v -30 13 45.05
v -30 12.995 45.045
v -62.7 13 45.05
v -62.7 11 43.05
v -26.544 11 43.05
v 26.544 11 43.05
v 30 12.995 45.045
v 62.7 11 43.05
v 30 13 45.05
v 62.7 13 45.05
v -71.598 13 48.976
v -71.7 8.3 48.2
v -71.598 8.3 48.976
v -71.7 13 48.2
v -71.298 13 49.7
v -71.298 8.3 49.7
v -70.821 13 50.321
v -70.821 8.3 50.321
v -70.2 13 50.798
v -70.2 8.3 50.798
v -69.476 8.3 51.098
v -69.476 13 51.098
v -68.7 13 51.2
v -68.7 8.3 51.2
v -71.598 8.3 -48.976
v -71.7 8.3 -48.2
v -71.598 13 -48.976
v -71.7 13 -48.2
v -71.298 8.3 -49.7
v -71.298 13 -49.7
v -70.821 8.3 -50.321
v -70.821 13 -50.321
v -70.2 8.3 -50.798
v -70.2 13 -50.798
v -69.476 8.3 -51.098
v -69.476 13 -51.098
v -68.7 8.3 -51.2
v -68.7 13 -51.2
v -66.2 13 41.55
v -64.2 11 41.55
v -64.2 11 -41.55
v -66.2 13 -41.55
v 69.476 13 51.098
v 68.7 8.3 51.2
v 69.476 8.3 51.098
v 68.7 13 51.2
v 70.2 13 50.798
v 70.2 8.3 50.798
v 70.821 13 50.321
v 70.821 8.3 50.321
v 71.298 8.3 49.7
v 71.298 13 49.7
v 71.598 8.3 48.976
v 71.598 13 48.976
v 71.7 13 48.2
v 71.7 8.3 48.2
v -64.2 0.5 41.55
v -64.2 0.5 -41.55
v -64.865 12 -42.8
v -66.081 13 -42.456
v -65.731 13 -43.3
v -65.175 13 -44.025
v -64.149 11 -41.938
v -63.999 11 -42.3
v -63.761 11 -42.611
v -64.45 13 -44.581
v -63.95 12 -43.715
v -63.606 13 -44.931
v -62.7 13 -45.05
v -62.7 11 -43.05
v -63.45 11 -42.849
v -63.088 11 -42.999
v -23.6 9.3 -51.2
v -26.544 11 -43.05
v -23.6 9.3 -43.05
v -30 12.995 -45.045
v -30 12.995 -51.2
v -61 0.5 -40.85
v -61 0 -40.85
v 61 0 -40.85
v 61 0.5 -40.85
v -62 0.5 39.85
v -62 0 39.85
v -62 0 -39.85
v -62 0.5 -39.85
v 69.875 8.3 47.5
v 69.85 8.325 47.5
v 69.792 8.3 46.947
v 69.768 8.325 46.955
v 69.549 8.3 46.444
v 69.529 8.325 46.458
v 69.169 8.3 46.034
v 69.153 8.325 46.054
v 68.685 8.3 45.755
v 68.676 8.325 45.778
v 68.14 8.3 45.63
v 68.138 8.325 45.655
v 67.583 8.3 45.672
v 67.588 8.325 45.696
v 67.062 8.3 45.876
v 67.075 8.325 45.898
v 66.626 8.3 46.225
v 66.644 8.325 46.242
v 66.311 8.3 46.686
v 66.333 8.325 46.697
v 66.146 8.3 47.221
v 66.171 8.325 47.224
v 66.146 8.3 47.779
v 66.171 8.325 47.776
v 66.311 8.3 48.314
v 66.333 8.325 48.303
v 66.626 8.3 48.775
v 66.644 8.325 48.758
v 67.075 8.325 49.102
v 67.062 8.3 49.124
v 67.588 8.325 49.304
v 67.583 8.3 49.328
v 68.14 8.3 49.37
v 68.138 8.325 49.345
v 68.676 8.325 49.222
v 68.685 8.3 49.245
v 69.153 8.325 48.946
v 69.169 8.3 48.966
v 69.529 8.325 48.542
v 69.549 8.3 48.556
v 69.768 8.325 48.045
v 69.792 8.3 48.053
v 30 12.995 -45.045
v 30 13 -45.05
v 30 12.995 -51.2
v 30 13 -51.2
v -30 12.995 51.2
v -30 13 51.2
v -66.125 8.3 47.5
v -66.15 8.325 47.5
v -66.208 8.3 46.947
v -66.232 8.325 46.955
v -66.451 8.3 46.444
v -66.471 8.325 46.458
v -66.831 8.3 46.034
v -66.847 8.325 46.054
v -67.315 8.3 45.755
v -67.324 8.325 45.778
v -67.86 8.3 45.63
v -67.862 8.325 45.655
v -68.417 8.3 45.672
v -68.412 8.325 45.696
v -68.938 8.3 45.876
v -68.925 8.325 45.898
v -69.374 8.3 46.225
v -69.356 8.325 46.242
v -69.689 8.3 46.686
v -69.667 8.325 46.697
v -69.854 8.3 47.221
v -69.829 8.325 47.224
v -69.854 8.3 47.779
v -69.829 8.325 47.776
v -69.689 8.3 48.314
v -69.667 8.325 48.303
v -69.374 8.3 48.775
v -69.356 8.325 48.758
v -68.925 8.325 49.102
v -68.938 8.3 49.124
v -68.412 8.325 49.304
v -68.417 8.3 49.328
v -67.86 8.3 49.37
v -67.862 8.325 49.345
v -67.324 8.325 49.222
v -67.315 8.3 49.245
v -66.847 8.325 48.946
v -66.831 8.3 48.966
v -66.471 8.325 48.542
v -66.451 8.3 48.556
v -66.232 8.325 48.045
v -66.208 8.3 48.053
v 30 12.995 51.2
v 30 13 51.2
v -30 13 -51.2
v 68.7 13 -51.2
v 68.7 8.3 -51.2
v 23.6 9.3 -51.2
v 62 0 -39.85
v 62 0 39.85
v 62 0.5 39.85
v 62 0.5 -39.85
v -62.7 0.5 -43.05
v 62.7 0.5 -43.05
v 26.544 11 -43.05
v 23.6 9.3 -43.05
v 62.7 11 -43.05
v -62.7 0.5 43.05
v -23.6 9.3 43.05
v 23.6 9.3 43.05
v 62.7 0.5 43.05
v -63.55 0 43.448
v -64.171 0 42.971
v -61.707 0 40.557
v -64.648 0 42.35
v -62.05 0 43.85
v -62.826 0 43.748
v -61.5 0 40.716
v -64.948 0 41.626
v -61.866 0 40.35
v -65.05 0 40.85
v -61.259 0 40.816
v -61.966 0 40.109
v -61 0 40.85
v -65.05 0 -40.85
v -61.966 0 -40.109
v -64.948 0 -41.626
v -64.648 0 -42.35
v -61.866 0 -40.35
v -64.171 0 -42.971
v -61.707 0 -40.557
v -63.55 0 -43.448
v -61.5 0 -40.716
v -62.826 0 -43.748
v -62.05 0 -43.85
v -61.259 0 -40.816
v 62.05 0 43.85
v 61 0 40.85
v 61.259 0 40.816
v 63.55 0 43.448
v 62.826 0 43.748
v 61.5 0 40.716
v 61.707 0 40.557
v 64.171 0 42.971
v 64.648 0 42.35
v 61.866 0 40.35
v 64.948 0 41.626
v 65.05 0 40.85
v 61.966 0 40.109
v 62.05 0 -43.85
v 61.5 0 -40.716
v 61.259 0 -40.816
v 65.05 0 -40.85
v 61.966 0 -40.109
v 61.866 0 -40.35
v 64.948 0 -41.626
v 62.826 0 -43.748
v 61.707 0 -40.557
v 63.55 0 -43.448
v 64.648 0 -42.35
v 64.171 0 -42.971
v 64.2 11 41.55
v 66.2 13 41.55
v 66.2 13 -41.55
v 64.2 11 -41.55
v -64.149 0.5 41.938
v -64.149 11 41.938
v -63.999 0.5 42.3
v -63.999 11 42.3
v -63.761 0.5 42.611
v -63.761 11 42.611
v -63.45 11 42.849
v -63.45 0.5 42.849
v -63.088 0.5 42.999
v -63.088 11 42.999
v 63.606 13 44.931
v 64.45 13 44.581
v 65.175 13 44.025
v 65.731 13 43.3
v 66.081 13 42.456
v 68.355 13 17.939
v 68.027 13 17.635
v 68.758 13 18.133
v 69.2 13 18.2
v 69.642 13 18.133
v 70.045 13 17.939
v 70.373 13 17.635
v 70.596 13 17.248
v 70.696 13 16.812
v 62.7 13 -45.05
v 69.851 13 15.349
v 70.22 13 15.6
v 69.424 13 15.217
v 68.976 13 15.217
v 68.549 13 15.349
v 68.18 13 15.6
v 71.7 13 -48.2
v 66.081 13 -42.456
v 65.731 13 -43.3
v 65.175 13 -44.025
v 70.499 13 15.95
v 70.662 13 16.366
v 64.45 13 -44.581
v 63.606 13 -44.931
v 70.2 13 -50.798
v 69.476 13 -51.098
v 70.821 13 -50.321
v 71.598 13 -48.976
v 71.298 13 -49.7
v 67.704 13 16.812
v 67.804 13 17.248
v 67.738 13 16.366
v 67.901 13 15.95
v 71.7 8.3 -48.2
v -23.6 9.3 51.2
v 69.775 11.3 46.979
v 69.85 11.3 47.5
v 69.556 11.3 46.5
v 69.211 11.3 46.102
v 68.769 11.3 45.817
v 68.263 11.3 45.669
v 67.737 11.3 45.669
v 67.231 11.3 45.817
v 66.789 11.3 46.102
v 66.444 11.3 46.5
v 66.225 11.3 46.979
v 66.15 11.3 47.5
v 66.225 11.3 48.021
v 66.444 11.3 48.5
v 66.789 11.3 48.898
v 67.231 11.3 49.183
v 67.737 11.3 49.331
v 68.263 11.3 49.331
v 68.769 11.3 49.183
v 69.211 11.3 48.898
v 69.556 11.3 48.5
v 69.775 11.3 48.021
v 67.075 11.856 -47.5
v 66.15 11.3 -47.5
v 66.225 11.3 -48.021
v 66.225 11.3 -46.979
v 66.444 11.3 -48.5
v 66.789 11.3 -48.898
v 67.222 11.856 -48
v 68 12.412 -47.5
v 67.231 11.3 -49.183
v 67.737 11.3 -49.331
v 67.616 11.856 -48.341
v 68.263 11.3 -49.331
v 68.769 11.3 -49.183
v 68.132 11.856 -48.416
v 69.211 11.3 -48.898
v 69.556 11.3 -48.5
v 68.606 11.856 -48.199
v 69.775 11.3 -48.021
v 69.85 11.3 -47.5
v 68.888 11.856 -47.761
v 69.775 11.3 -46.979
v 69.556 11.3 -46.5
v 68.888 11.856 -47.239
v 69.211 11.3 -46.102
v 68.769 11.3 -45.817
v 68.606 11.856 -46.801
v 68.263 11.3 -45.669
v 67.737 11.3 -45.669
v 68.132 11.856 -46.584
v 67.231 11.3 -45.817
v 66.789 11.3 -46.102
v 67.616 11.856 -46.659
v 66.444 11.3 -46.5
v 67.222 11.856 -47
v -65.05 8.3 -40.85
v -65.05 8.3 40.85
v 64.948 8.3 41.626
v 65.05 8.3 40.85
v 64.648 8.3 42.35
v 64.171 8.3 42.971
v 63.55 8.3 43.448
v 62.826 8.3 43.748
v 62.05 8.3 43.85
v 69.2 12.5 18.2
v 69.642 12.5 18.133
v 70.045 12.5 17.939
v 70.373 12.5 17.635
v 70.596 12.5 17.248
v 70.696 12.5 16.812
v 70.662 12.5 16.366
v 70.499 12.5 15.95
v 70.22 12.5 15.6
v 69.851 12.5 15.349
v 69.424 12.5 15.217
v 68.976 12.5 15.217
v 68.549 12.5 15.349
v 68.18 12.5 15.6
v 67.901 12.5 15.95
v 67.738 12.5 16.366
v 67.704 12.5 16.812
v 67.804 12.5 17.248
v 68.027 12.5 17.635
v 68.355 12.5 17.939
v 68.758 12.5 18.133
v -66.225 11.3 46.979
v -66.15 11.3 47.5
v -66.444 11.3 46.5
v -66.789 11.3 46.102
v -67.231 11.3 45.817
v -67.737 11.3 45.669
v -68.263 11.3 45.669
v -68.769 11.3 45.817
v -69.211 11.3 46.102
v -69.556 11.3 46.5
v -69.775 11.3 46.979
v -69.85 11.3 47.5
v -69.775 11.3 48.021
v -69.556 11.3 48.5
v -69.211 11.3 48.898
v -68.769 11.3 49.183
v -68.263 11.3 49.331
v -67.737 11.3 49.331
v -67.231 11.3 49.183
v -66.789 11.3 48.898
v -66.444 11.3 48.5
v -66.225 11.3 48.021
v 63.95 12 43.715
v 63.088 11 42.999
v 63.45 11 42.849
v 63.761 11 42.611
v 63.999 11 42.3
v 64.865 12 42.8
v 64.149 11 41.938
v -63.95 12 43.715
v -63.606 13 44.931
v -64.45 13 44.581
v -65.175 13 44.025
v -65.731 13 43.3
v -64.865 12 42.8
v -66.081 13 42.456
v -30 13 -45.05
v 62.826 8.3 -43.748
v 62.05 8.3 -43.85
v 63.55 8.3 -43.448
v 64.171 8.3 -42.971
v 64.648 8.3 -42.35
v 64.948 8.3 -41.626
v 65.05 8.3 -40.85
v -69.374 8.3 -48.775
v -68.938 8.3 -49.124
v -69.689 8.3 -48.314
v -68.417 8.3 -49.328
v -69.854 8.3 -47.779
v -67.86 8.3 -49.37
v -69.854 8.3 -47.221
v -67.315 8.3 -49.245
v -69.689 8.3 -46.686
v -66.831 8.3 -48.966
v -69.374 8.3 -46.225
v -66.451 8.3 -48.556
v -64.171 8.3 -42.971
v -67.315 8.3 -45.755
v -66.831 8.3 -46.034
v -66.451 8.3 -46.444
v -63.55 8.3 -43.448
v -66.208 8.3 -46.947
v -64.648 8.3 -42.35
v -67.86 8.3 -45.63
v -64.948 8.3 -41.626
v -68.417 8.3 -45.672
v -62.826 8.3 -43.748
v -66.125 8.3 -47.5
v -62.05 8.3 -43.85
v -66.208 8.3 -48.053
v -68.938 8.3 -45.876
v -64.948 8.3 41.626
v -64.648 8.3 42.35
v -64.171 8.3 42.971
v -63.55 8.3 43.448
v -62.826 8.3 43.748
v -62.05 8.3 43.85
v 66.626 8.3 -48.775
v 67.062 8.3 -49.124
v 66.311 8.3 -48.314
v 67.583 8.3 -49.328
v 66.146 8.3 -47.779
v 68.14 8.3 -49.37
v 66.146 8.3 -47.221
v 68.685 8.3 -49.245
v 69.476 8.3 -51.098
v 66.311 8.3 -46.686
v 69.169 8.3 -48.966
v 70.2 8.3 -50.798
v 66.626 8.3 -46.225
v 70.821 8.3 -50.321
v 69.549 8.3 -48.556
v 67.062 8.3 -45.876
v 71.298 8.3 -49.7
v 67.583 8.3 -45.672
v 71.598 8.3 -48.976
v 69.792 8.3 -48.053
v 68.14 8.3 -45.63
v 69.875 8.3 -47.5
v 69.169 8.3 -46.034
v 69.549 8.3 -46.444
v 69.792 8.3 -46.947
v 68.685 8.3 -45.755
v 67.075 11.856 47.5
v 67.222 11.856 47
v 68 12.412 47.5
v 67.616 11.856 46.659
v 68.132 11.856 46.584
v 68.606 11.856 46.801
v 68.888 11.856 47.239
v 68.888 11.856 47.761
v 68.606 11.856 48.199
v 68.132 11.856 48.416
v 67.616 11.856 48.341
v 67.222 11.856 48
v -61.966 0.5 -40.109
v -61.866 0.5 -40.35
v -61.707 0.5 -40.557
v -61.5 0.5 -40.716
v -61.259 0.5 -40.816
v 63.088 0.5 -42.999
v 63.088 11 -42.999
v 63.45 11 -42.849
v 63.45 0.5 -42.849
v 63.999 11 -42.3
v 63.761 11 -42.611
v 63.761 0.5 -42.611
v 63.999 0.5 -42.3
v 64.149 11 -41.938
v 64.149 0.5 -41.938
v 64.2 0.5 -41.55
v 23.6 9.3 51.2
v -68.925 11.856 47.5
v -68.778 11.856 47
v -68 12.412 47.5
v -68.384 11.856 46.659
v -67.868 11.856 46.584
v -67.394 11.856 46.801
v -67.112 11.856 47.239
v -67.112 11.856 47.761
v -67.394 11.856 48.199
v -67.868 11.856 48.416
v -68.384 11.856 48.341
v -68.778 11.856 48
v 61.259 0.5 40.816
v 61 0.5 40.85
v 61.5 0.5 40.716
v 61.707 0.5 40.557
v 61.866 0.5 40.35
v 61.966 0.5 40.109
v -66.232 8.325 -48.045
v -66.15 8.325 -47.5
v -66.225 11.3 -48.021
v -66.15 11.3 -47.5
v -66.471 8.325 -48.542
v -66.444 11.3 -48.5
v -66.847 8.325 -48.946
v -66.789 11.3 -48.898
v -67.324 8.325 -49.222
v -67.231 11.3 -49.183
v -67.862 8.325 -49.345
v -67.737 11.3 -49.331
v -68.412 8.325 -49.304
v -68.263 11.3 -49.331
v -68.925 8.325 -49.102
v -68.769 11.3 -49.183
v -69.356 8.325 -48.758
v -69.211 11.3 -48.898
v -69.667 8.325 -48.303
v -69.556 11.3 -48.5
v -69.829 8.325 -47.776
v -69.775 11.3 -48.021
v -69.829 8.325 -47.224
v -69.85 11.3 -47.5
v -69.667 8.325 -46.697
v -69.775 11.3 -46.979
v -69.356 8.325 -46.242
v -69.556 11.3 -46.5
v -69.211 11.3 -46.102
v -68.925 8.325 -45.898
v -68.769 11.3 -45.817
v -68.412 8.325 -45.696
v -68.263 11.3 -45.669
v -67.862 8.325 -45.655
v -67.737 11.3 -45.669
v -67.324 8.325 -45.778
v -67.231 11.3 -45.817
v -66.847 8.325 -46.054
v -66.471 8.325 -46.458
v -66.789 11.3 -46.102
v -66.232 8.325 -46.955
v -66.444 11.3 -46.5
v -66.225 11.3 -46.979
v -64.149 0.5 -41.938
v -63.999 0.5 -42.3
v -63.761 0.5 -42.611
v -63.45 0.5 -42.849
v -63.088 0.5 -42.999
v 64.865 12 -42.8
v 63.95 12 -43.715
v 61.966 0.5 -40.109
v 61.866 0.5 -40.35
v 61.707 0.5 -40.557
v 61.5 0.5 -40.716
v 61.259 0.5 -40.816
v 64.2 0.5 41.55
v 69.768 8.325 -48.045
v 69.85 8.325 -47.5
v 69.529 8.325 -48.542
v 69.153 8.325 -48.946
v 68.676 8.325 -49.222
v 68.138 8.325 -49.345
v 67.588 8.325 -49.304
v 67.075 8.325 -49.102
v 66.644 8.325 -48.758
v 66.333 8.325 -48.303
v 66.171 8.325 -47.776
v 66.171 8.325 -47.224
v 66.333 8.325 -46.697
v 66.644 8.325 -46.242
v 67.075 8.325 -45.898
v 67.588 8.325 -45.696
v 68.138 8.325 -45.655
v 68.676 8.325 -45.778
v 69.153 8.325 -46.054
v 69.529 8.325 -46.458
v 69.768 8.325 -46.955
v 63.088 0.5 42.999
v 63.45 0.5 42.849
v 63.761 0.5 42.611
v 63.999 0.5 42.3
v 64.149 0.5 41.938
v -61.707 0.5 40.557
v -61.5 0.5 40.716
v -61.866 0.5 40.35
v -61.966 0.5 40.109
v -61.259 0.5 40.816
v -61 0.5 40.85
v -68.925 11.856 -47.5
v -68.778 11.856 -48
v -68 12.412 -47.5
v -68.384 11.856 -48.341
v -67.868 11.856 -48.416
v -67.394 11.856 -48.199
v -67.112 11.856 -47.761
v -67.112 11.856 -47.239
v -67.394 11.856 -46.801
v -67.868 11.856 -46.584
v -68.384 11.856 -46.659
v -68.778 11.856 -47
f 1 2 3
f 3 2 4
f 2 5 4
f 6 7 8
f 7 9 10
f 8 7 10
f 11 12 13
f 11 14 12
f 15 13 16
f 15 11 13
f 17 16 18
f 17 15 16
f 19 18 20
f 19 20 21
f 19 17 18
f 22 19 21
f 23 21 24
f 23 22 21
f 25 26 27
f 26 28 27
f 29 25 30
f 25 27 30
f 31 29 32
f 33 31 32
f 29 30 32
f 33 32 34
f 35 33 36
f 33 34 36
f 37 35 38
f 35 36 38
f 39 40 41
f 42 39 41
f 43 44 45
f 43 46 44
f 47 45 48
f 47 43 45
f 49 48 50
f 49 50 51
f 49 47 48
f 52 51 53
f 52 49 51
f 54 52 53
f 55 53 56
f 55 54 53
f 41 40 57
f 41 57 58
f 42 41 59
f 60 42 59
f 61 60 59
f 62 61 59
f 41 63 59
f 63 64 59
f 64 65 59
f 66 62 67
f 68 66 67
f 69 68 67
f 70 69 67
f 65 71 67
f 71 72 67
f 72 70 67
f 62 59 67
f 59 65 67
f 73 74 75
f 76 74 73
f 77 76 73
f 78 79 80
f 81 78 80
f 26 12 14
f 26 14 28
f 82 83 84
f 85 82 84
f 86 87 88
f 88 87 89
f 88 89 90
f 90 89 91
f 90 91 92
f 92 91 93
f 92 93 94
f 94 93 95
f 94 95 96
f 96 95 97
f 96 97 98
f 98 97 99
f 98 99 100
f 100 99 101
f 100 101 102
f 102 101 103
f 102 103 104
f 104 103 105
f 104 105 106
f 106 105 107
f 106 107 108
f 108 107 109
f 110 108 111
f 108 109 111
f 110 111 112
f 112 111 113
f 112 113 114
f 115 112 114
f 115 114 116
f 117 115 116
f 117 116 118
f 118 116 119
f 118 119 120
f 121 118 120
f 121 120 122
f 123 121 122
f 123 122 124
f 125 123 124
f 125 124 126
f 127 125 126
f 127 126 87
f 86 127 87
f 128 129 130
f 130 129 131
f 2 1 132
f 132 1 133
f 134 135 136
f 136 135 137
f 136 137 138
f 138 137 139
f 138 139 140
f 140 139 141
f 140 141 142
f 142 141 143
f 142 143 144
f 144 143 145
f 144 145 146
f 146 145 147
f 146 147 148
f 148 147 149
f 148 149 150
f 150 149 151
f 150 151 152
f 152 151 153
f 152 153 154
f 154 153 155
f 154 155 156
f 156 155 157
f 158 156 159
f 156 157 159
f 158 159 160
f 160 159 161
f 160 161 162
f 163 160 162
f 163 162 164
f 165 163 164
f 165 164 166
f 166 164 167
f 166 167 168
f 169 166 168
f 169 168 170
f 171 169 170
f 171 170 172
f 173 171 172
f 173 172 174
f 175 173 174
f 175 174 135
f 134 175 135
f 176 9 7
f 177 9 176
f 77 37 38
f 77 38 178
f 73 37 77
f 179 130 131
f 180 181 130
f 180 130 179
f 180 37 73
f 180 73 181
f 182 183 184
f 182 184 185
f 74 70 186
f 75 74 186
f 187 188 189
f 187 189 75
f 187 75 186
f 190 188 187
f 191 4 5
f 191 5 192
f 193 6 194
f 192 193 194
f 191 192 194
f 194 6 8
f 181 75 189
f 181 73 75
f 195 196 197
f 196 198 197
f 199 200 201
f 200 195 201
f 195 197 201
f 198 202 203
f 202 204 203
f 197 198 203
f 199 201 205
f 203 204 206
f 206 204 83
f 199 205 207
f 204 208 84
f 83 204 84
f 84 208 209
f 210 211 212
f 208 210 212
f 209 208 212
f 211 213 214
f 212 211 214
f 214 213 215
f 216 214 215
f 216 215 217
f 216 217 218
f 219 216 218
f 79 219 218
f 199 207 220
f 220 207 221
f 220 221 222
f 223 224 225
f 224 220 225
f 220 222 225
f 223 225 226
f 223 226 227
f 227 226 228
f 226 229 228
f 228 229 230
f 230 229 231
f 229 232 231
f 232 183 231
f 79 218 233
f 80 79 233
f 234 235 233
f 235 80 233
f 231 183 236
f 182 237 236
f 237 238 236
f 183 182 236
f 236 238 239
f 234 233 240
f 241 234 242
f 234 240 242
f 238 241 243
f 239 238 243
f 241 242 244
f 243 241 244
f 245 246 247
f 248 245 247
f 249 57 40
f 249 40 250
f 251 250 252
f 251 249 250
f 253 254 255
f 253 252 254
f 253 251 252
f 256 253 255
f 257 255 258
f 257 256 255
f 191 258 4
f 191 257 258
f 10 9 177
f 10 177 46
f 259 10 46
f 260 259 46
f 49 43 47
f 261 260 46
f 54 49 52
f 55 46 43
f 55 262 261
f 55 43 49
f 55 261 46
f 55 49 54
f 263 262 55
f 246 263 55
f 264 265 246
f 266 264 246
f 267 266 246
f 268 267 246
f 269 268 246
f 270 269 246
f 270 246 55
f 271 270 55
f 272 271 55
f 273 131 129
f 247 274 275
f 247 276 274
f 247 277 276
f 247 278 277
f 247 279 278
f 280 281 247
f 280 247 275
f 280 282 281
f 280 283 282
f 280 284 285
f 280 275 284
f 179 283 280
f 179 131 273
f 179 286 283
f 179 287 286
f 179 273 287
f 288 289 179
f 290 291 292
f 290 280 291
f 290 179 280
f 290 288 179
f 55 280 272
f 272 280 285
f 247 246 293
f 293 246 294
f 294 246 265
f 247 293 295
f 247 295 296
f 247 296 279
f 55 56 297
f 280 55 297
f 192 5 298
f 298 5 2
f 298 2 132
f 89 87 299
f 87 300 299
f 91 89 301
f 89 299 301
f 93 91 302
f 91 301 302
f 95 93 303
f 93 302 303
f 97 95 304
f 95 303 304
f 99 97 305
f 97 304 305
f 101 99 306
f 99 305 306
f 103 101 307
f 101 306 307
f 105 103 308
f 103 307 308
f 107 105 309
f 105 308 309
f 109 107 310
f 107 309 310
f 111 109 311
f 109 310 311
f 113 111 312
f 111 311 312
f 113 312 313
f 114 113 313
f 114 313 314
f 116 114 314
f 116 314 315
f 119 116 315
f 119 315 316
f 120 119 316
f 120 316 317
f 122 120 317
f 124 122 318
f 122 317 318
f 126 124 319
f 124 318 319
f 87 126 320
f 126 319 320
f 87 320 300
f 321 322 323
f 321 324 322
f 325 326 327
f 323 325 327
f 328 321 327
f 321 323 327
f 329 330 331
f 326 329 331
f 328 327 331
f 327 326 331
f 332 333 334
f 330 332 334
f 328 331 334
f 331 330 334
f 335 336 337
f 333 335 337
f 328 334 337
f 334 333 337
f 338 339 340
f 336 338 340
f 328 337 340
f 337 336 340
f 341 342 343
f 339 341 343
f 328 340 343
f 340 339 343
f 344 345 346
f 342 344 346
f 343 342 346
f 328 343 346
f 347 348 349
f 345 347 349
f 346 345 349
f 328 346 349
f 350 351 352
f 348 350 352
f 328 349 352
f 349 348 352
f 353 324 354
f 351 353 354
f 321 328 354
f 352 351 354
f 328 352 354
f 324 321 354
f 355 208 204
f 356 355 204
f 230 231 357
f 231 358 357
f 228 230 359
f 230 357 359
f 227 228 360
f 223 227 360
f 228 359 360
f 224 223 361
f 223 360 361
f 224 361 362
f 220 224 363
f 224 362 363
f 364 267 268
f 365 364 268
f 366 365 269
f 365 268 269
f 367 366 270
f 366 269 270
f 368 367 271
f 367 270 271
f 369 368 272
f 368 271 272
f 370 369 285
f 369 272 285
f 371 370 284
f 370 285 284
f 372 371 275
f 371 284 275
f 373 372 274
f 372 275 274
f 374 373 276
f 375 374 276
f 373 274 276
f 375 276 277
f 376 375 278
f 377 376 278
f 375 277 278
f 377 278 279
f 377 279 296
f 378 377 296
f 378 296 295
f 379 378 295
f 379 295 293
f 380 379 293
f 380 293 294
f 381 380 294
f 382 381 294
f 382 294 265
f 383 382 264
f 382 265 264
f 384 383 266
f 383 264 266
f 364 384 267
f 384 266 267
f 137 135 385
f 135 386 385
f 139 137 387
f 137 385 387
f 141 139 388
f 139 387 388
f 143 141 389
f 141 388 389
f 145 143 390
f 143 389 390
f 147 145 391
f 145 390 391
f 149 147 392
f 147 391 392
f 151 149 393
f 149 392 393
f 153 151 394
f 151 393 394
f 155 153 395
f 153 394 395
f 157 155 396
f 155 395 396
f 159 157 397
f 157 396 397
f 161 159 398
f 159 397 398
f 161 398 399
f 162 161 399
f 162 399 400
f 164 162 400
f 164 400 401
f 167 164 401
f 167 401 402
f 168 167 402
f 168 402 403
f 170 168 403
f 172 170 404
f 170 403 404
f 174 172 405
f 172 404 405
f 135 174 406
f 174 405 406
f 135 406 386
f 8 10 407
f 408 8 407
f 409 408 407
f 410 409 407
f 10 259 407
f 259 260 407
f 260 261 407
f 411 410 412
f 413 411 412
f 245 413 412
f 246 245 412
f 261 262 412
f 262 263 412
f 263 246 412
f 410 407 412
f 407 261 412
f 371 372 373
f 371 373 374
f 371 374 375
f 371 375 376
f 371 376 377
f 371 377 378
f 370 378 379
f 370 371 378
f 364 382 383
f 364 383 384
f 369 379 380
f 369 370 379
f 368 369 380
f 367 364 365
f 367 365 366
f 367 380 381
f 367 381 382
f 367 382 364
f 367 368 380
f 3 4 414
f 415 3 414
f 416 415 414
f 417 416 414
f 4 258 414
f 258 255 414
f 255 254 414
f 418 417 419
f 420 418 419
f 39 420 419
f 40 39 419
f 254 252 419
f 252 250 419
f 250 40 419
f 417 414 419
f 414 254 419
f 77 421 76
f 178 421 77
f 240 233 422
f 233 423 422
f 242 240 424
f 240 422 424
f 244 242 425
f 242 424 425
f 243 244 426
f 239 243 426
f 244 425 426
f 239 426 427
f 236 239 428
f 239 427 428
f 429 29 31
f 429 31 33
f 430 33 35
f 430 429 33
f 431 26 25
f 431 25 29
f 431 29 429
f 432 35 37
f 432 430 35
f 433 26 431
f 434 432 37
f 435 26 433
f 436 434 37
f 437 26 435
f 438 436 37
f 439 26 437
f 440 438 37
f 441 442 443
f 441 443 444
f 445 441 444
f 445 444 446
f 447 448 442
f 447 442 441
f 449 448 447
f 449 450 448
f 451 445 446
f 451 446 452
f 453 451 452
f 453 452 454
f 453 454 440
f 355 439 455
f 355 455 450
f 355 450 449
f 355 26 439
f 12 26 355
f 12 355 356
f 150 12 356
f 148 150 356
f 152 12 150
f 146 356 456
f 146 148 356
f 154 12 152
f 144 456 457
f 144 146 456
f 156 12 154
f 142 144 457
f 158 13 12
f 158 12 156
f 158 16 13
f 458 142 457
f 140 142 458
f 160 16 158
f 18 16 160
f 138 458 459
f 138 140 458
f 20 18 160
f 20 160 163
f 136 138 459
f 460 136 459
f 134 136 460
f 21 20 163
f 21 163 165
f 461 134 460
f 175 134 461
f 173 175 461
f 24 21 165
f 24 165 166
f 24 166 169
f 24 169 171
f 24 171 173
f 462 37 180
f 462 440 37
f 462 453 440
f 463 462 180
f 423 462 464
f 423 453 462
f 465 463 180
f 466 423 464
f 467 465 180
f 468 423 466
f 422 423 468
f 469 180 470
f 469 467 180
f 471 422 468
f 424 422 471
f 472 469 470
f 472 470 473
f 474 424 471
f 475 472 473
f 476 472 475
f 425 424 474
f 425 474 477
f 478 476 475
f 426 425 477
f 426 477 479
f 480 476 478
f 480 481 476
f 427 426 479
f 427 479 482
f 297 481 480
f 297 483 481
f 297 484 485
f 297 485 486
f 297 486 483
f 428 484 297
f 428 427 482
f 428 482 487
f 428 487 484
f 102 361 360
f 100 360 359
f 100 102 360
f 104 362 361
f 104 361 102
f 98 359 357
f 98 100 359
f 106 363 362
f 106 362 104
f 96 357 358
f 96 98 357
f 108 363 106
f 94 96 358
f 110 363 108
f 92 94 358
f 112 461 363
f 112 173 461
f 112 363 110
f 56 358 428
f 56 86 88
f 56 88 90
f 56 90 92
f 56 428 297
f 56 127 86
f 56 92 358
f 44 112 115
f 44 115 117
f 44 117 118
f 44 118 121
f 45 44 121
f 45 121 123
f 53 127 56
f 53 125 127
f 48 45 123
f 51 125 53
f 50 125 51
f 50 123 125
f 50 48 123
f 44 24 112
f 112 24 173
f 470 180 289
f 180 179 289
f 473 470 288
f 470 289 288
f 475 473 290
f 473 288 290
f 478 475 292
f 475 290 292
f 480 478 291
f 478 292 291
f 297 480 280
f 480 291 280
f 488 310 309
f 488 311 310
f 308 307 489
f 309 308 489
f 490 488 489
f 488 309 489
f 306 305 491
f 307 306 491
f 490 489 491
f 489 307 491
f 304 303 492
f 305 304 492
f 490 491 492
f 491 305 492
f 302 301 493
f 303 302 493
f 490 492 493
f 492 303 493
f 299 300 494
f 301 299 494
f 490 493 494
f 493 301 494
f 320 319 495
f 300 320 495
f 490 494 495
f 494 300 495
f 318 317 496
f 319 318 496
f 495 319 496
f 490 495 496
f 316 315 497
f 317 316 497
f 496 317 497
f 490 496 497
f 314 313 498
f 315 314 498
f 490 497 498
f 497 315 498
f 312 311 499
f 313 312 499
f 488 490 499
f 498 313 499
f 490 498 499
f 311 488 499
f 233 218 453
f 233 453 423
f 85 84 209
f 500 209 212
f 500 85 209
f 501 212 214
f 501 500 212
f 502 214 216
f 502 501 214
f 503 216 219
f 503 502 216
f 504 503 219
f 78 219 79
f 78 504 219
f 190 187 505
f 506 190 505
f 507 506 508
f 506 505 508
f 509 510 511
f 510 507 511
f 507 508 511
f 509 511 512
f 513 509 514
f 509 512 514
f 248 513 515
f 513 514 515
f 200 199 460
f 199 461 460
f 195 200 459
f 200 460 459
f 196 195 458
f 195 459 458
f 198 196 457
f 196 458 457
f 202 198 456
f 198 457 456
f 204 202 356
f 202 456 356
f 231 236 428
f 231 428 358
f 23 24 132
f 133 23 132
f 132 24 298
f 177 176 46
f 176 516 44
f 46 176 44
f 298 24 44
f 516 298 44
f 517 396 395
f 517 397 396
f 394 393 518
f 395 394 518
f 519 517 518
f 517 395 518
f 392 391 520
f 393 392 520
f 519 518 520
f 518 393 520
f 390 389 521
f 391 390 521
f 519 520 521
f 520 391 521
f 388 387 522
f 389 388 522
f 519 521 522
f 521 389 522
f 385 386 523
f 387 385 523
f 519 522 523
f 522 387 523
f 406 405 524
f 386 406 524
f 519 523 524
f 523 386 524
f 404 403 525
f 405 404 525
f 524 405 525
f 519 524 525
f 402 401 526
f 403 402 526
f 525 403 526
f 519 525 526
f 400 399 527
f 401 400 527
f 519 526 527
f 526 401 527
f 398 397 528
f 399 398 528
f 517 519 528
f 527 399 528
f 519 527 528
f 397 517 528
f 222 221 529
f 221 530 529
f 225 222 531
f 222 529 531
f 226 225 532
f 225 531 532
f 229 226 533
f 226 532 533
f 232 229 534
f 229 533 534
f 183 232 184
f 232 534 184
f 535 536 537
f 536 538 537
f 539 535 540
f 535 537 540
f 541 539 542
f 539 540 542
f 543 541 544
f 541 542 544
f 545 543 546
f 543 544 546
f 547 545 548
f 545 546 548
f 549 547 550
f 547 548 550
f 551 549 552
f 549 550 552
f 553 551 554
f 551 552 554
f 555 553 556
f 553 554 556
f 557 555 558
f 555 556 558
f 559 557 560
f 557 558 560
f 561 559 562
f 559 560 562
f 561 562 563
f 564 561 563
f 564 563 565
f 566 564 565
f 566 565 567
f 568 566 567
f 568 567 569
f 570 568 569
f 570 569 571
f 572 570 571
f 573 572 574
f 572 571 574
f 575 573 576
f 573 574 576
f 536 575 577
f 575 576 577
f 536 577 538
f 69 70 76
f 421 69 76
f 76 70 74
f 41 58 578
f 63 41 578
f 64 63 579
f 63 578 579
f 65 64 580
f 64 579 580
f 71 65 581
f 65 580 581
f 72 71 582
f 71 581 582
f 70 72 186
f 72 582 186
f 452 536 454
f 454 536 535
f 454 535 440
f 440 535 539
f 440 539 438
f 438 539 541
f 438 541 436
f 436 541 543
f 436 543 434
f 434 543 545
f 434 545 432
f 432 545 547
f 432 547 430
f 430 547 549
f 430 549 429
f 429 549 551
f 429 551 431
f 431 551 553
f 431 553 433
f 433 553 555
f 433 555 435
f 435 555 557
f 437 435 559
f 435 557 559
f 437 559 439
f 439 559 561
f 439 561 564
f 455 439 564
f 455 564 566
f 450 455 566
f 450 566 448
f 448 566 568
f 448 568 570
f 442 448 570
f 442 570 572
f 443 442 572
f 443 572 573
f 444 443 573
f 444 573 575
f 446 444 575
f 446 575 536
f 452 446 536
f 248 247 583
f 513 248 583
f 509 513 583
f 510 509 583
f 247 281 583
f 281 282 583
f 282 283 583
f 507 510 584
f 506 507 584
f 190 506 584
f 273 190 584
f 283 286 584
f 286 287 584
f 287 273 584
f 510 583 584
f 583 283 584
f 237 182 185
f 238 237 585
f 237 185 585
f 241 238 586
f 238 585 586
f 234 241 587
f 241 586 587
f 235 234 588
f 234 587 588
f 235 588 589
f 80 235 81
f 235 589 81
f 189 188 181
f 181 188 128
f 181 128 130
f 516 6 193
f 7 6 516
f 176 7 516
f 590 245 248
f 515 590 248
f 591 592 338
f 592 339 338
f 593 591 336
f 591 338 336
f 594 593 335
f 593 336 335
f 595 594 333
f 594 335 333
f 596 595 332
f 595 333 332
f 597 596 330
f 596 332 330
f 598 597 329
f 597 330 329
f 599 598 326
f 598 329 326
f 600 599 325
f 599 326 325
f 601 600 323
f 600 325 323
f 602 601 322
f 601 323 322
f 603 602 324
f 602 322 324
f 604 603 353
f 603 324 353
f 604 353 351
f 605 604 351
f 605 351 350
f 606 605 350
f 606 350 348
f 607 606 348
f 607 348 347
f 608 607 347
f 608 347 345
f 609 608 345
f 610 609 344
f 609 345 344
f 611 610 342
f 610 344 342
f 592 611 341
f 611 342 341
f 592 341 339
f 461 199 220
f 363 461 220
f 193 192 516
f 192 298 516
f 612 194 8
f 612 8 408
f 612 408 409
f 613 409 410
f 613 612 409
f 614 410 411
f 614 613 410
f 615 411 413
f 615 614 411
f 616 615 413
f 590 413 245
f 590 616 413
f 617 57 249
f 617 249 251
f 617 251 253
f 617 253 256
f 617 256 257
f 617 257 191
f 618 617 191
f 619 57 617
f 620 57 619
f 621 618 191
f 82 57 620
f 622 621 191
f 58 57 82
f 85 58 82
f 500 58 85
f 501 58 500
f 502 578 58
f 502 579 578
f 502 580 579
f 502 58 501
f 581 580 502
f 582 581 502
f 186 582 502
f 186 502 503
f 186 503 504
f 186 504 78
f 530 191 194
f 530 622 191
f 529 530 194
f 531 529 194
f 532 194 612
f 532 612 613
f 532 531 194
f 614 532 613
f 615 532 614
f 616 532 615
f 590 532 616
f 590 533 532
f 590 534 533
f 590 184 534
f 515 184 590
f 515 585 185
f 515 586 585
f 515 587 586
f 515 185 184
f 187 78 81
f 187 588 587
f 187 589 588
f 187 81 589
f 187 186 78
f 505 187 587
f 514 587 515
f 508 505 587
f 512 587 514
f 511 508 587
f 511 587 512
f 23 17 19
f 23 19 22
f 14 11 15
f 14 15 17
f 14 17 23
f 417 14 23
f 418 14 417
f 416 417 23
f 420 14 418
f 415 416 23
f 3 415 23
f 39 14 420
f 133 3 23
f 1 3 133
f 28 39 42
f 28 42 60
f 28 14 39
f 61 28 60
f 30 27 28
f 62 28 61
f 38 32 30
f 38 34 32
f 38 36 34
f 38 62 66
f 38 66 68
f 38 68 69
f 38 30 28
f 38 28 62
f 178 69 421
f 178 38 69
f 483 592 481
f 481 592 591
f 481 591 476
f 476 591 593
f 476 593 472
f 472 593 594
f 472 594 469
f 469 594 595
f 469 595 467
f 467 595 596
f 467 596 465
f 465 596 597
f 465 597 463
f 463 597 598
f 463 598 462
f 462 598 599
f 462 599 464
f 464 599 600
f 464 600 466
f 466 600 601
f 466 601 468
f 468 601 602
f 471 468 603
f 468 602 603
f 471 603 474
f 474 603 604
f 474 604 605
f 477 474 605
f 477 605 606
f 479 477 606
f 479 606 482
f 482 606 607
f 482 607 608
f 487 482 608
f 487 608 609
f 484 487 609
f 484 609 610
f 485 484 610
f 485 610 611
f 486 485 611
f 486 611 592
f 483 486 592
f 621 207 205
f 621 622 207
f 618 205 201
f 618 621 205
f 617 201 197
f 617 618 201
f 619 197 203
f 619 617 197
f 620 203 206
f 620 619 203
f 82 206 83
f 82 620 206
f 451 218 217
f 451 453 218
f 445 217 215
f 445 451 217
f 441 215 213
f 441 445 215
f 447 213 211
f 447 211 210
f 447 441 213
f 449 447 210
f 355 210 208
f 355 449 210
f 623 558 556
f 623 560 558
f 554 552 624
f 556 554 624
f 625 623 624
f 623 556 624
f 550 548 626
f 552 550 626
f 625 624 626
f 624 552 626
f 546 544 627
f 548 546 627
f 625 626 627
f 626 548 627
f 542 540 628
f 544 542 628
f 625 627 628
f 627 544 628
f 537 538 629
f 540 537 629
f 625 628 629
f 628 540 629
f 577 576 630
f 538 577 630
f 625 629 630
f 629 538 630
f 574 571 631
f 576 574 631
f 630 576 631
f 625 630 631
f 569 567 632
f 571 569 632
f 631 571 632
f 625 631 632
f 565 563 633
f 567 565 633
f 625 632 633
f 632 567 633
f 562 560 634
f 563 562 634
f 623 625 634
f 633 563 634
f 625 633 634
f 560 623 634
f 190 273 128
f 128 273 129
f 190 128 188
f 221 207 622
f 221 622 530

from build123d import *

# Parameters (mm, degrees)
SKETCH1_W                            = 143.4
SKETCH1_H                            = 102.4
SKETCH1_W_2                          = 124
SKETCH1_H_2                          = 81.7
BOSS_EXTRUDE1_DEPTH                  = 13
SKETCH2_W                            = 128.4
SKETCH2_H                            = 86.1
CUT_EXTRUDE1_DEPTH                   = 12.5
SKETCH3_W                            = 143.4
SKETCH3_H                            = 102.4
SKETCH3_W_2                          = 130.1
SKETCH3_H_2                          = 87.7
CUT_EXTRUDE3_DEPTH                   = 8.3
FILLET1_R                            = 1
FILLET2_R                            = 1.5
FILLET3_R                            = 3
SKETCH4_W                            = 60
SKETCH4_H                            = 8.15
CUT_EXTRUDE4_DEPTH                   = 3.7
CHAMFER1_SIZE                        = 6.4
CHAMFER1_SIZE2                       = 3.695041723
CHAMFER2_SIZE                        = 6.4
CHAMFER2_SIZE2                       = 3.695041723
SKETCH5_R                            = 1.5
CUT_EXTRUDE5_DEPTH                   = 0.5
CHAMFER3_SIZE                        = 2
F_3_7_3_7_DIAMETER_HOLE1_D           = 3.7
F_3_7_3_7_DIAMETER_HOLE1_DEPTH       = 3
F_3_7_3_7_DIAMETER_HOLE1_CSINK_D     = 3.75
F_3_7_3_7_DIAMETER_HOLE1_CSINK_ANGLE = 90
F_3_7_3_7_DIAMETER_HOLE1_TIP         = 1.111592145


with BuildPart() as part:
    # Sketch1 → Boss-Extrude1 (new body)
    with BuildSketch(Plane(origin=(0, 0, 0), x_dir=(1, 0, 0), z_dir=(0, 1, 0))):
        Rectangle(SKETCH1_W, SKETCH1_H)
        Rectangle(SKETCH1_W_2, SKETCH1_H_2, mode=Mode.SUBTRACT)
    extrude(amount=BOSS_EXTRUDE1_DEPTH)

    # Sketch2 → Cut-Extrude1 (cut)
    with BuildSketch(Plane(origin=(0, 13, 0), x_dir=(1, 0, 0), z_dir=(0, 1, 0))):
        Rectangle(SKETCH2_W, SKETCH2_H)
    extrude(amount=-CUT_EXTRUDE1_DEPTH, mode=Mode.SUBTRACT)

    # Sketch3 → Cut-Extrude3 (cut)
    with BuildSketch(Plane.XZ):
        Rectangle(SKETCH3_W, SKETCH3_H)
        Rectangle(SKETCH3_W_2, SKETCH3_H_2, mode=Mode.SUBTRACT)
    extrude(amount=-CUT_EXTRUDE3_DEPTH, mode=Mode.SUBTRACT)

    # Fillet1
    fillet1_edges = [part.edges().sort_by_distance(p)[0] for p in [
        (-62, 0.25, 40.85),
        (62, 0.25, 40.85),
        (-62, 0.25, -40.85),
        (62, 0.25, -40.85),
    ]]
    fillet(fillet1_edges, radius=FILLET1_R)

    # Fillet2
    fillet2_edges = [part.edges().sort_by_distance(p)[0] for p in [
        (64.2, 6.75, -43.05),
        (64.2, 6.75, 43.05),
        (-64.2, 6.75, 43.05),
        (-64.2, 6.75, -43.05),
    ]]
    fillet(fillet2_edges, radius=FILLET2_R)

    # Fillet3
    fillet3_edges = [part.edges().sort_by_distance(p)[0] for p in [
        (65.05, 4.15, -43.85),
        (-65.05, 4.15, -43.85),
        (-65.05, 4.15, 43.85),
        (65.05, 4.15, 43.85),
        (71.7, 10.65, 51.2),
        (-71.7, 10.65, 51.2),
        (-71.7, 10.65, -51.2),
        (71.7, 10.65, -51.2),
    ]]
    fillet(fillet3_edges, radius=FILLET3_R)

    # Sketch4 → Cut-Extrude4 (cut)
    with BuildSketch(Plane(origin=(0, 13, 0), x_dir=(1, 0, 0), z_dir=(0, 1, 0))):
        with Locations((0, 47.125)):
            Rectangle(SKETCH4_W, SKETCH4_H)
    cut_extrude4 = extrude(amount=-CUT_EXTRUDE4_DEPTH, mode=Mode.SUBTRACT)

    # Mirror1: Cut-Extrude4 across plane
    add(cut_extrude4.mirror(Plane.XY), mode=Mode.SUBTRACT)

    # Chamfer1
    chamfer1_edges = [part.edges().sort_by_distance(p)[0] for p in [
        (-30, 9.3, -47.125),
        (30, 9.3, -47.125),
    ]]
    chamfer1_side = [part.faces().sort_by_distance(p)[0] for p in [
        (0, 9.3, -47.125),
    ]]
    chamfer(chamfer1_edges, length=CHAMFER1_SIZE, length2=CHAMFER1_SIZE2, reference=chamfer1_side[0])

    # Chamfer2
    chamfer2_edges = [part.edges().sort_by_distance(p)[0] for p in [
        (30, 9.3, 47.125),
        (-30, 9.3, 47.125),
    ]]
    chamfer2_side = [part.faces().sort_by_distance(p)[0] for p in [
        (0, 9.3, 47.125),
    ]]
    chamfer(chamfer2_edges, length=CHAMFER2_SIZE, length2=CHAMFER2_SIZE2, reference=chamfer2_side[0])

    # Sketch5 → Cut-Extrude5 (cut)
    with BuildSketch(Plane(origin=(0, 13, 0), x_dir=(1, 0, 0), z_dir=(0, 1, 0))):
        with Locations(Location((69.2, -16.7, 0), (0, 0, 270))):
            Circle(SKETCH5_R)
    extrude(amount=-CUT_EXTRUDE5_DEPTH, mode=Mode.SUBTRACT)

    # Chamfer3
    chamfer3_edges = [part.edges().sort_by_distance(p)[0] for p in [
        (46.35, 13, 43.05),
        (63.760660172, 13, 42.610660172),
        (64.2, 13, 0),
        (63.760660172, 13, -42.610660172),
        (46.35, 13, -43.05),
        (-46.35, 13, -43.05),
        (-46.35, 13, 43.05),
        (-63.760660172, 13, -42.610660172),
        (-63.760660172, 13, 42.610660172),
        (-64.2, 13, 0),
    ]]
    chamfer(chamfer3_edges, length=CHAMFER3_SIZE)

    # Ø3.7 (3.7) Diameter Hole1
    with Locations(Plane(origin=(0, 8.3, 0), x_dir=(-1, 0, 0), z_dir=(0, -1, 0))):
        with Locations((-68, 47.5), (-68, -47.5), (68, 47.5), (68, -47.5)):
            CounterSinkHole(F_3_7_3_7_DIAMETER_HOLE1_D / 2, F_3_7_3_7_DIAMETER_HOLE1_CSINK_D / 2, depth=F_3_7_3_7_DIAMETER_HOLE1_DEPTH, counter_sink_angle=F_3_7_3_7_DIAMETER_HOLE1_CSINK_ANGLE)
            with Locations((0, 0, -(F_3_7_3_7_DIAMETER_HOLE1_DEPTH + F_3_7_3_7_DIAMETER_HOLE1_TIP / 2))):  # 118° drill point
                Cone(0, F_3_7_3_7_DIAMETER_HOLE1_D / 2, F_3_7_3_7_DIAMETER_HOLE1_TIP, mode=Mode.SUBTRACT)


solid = part.part
